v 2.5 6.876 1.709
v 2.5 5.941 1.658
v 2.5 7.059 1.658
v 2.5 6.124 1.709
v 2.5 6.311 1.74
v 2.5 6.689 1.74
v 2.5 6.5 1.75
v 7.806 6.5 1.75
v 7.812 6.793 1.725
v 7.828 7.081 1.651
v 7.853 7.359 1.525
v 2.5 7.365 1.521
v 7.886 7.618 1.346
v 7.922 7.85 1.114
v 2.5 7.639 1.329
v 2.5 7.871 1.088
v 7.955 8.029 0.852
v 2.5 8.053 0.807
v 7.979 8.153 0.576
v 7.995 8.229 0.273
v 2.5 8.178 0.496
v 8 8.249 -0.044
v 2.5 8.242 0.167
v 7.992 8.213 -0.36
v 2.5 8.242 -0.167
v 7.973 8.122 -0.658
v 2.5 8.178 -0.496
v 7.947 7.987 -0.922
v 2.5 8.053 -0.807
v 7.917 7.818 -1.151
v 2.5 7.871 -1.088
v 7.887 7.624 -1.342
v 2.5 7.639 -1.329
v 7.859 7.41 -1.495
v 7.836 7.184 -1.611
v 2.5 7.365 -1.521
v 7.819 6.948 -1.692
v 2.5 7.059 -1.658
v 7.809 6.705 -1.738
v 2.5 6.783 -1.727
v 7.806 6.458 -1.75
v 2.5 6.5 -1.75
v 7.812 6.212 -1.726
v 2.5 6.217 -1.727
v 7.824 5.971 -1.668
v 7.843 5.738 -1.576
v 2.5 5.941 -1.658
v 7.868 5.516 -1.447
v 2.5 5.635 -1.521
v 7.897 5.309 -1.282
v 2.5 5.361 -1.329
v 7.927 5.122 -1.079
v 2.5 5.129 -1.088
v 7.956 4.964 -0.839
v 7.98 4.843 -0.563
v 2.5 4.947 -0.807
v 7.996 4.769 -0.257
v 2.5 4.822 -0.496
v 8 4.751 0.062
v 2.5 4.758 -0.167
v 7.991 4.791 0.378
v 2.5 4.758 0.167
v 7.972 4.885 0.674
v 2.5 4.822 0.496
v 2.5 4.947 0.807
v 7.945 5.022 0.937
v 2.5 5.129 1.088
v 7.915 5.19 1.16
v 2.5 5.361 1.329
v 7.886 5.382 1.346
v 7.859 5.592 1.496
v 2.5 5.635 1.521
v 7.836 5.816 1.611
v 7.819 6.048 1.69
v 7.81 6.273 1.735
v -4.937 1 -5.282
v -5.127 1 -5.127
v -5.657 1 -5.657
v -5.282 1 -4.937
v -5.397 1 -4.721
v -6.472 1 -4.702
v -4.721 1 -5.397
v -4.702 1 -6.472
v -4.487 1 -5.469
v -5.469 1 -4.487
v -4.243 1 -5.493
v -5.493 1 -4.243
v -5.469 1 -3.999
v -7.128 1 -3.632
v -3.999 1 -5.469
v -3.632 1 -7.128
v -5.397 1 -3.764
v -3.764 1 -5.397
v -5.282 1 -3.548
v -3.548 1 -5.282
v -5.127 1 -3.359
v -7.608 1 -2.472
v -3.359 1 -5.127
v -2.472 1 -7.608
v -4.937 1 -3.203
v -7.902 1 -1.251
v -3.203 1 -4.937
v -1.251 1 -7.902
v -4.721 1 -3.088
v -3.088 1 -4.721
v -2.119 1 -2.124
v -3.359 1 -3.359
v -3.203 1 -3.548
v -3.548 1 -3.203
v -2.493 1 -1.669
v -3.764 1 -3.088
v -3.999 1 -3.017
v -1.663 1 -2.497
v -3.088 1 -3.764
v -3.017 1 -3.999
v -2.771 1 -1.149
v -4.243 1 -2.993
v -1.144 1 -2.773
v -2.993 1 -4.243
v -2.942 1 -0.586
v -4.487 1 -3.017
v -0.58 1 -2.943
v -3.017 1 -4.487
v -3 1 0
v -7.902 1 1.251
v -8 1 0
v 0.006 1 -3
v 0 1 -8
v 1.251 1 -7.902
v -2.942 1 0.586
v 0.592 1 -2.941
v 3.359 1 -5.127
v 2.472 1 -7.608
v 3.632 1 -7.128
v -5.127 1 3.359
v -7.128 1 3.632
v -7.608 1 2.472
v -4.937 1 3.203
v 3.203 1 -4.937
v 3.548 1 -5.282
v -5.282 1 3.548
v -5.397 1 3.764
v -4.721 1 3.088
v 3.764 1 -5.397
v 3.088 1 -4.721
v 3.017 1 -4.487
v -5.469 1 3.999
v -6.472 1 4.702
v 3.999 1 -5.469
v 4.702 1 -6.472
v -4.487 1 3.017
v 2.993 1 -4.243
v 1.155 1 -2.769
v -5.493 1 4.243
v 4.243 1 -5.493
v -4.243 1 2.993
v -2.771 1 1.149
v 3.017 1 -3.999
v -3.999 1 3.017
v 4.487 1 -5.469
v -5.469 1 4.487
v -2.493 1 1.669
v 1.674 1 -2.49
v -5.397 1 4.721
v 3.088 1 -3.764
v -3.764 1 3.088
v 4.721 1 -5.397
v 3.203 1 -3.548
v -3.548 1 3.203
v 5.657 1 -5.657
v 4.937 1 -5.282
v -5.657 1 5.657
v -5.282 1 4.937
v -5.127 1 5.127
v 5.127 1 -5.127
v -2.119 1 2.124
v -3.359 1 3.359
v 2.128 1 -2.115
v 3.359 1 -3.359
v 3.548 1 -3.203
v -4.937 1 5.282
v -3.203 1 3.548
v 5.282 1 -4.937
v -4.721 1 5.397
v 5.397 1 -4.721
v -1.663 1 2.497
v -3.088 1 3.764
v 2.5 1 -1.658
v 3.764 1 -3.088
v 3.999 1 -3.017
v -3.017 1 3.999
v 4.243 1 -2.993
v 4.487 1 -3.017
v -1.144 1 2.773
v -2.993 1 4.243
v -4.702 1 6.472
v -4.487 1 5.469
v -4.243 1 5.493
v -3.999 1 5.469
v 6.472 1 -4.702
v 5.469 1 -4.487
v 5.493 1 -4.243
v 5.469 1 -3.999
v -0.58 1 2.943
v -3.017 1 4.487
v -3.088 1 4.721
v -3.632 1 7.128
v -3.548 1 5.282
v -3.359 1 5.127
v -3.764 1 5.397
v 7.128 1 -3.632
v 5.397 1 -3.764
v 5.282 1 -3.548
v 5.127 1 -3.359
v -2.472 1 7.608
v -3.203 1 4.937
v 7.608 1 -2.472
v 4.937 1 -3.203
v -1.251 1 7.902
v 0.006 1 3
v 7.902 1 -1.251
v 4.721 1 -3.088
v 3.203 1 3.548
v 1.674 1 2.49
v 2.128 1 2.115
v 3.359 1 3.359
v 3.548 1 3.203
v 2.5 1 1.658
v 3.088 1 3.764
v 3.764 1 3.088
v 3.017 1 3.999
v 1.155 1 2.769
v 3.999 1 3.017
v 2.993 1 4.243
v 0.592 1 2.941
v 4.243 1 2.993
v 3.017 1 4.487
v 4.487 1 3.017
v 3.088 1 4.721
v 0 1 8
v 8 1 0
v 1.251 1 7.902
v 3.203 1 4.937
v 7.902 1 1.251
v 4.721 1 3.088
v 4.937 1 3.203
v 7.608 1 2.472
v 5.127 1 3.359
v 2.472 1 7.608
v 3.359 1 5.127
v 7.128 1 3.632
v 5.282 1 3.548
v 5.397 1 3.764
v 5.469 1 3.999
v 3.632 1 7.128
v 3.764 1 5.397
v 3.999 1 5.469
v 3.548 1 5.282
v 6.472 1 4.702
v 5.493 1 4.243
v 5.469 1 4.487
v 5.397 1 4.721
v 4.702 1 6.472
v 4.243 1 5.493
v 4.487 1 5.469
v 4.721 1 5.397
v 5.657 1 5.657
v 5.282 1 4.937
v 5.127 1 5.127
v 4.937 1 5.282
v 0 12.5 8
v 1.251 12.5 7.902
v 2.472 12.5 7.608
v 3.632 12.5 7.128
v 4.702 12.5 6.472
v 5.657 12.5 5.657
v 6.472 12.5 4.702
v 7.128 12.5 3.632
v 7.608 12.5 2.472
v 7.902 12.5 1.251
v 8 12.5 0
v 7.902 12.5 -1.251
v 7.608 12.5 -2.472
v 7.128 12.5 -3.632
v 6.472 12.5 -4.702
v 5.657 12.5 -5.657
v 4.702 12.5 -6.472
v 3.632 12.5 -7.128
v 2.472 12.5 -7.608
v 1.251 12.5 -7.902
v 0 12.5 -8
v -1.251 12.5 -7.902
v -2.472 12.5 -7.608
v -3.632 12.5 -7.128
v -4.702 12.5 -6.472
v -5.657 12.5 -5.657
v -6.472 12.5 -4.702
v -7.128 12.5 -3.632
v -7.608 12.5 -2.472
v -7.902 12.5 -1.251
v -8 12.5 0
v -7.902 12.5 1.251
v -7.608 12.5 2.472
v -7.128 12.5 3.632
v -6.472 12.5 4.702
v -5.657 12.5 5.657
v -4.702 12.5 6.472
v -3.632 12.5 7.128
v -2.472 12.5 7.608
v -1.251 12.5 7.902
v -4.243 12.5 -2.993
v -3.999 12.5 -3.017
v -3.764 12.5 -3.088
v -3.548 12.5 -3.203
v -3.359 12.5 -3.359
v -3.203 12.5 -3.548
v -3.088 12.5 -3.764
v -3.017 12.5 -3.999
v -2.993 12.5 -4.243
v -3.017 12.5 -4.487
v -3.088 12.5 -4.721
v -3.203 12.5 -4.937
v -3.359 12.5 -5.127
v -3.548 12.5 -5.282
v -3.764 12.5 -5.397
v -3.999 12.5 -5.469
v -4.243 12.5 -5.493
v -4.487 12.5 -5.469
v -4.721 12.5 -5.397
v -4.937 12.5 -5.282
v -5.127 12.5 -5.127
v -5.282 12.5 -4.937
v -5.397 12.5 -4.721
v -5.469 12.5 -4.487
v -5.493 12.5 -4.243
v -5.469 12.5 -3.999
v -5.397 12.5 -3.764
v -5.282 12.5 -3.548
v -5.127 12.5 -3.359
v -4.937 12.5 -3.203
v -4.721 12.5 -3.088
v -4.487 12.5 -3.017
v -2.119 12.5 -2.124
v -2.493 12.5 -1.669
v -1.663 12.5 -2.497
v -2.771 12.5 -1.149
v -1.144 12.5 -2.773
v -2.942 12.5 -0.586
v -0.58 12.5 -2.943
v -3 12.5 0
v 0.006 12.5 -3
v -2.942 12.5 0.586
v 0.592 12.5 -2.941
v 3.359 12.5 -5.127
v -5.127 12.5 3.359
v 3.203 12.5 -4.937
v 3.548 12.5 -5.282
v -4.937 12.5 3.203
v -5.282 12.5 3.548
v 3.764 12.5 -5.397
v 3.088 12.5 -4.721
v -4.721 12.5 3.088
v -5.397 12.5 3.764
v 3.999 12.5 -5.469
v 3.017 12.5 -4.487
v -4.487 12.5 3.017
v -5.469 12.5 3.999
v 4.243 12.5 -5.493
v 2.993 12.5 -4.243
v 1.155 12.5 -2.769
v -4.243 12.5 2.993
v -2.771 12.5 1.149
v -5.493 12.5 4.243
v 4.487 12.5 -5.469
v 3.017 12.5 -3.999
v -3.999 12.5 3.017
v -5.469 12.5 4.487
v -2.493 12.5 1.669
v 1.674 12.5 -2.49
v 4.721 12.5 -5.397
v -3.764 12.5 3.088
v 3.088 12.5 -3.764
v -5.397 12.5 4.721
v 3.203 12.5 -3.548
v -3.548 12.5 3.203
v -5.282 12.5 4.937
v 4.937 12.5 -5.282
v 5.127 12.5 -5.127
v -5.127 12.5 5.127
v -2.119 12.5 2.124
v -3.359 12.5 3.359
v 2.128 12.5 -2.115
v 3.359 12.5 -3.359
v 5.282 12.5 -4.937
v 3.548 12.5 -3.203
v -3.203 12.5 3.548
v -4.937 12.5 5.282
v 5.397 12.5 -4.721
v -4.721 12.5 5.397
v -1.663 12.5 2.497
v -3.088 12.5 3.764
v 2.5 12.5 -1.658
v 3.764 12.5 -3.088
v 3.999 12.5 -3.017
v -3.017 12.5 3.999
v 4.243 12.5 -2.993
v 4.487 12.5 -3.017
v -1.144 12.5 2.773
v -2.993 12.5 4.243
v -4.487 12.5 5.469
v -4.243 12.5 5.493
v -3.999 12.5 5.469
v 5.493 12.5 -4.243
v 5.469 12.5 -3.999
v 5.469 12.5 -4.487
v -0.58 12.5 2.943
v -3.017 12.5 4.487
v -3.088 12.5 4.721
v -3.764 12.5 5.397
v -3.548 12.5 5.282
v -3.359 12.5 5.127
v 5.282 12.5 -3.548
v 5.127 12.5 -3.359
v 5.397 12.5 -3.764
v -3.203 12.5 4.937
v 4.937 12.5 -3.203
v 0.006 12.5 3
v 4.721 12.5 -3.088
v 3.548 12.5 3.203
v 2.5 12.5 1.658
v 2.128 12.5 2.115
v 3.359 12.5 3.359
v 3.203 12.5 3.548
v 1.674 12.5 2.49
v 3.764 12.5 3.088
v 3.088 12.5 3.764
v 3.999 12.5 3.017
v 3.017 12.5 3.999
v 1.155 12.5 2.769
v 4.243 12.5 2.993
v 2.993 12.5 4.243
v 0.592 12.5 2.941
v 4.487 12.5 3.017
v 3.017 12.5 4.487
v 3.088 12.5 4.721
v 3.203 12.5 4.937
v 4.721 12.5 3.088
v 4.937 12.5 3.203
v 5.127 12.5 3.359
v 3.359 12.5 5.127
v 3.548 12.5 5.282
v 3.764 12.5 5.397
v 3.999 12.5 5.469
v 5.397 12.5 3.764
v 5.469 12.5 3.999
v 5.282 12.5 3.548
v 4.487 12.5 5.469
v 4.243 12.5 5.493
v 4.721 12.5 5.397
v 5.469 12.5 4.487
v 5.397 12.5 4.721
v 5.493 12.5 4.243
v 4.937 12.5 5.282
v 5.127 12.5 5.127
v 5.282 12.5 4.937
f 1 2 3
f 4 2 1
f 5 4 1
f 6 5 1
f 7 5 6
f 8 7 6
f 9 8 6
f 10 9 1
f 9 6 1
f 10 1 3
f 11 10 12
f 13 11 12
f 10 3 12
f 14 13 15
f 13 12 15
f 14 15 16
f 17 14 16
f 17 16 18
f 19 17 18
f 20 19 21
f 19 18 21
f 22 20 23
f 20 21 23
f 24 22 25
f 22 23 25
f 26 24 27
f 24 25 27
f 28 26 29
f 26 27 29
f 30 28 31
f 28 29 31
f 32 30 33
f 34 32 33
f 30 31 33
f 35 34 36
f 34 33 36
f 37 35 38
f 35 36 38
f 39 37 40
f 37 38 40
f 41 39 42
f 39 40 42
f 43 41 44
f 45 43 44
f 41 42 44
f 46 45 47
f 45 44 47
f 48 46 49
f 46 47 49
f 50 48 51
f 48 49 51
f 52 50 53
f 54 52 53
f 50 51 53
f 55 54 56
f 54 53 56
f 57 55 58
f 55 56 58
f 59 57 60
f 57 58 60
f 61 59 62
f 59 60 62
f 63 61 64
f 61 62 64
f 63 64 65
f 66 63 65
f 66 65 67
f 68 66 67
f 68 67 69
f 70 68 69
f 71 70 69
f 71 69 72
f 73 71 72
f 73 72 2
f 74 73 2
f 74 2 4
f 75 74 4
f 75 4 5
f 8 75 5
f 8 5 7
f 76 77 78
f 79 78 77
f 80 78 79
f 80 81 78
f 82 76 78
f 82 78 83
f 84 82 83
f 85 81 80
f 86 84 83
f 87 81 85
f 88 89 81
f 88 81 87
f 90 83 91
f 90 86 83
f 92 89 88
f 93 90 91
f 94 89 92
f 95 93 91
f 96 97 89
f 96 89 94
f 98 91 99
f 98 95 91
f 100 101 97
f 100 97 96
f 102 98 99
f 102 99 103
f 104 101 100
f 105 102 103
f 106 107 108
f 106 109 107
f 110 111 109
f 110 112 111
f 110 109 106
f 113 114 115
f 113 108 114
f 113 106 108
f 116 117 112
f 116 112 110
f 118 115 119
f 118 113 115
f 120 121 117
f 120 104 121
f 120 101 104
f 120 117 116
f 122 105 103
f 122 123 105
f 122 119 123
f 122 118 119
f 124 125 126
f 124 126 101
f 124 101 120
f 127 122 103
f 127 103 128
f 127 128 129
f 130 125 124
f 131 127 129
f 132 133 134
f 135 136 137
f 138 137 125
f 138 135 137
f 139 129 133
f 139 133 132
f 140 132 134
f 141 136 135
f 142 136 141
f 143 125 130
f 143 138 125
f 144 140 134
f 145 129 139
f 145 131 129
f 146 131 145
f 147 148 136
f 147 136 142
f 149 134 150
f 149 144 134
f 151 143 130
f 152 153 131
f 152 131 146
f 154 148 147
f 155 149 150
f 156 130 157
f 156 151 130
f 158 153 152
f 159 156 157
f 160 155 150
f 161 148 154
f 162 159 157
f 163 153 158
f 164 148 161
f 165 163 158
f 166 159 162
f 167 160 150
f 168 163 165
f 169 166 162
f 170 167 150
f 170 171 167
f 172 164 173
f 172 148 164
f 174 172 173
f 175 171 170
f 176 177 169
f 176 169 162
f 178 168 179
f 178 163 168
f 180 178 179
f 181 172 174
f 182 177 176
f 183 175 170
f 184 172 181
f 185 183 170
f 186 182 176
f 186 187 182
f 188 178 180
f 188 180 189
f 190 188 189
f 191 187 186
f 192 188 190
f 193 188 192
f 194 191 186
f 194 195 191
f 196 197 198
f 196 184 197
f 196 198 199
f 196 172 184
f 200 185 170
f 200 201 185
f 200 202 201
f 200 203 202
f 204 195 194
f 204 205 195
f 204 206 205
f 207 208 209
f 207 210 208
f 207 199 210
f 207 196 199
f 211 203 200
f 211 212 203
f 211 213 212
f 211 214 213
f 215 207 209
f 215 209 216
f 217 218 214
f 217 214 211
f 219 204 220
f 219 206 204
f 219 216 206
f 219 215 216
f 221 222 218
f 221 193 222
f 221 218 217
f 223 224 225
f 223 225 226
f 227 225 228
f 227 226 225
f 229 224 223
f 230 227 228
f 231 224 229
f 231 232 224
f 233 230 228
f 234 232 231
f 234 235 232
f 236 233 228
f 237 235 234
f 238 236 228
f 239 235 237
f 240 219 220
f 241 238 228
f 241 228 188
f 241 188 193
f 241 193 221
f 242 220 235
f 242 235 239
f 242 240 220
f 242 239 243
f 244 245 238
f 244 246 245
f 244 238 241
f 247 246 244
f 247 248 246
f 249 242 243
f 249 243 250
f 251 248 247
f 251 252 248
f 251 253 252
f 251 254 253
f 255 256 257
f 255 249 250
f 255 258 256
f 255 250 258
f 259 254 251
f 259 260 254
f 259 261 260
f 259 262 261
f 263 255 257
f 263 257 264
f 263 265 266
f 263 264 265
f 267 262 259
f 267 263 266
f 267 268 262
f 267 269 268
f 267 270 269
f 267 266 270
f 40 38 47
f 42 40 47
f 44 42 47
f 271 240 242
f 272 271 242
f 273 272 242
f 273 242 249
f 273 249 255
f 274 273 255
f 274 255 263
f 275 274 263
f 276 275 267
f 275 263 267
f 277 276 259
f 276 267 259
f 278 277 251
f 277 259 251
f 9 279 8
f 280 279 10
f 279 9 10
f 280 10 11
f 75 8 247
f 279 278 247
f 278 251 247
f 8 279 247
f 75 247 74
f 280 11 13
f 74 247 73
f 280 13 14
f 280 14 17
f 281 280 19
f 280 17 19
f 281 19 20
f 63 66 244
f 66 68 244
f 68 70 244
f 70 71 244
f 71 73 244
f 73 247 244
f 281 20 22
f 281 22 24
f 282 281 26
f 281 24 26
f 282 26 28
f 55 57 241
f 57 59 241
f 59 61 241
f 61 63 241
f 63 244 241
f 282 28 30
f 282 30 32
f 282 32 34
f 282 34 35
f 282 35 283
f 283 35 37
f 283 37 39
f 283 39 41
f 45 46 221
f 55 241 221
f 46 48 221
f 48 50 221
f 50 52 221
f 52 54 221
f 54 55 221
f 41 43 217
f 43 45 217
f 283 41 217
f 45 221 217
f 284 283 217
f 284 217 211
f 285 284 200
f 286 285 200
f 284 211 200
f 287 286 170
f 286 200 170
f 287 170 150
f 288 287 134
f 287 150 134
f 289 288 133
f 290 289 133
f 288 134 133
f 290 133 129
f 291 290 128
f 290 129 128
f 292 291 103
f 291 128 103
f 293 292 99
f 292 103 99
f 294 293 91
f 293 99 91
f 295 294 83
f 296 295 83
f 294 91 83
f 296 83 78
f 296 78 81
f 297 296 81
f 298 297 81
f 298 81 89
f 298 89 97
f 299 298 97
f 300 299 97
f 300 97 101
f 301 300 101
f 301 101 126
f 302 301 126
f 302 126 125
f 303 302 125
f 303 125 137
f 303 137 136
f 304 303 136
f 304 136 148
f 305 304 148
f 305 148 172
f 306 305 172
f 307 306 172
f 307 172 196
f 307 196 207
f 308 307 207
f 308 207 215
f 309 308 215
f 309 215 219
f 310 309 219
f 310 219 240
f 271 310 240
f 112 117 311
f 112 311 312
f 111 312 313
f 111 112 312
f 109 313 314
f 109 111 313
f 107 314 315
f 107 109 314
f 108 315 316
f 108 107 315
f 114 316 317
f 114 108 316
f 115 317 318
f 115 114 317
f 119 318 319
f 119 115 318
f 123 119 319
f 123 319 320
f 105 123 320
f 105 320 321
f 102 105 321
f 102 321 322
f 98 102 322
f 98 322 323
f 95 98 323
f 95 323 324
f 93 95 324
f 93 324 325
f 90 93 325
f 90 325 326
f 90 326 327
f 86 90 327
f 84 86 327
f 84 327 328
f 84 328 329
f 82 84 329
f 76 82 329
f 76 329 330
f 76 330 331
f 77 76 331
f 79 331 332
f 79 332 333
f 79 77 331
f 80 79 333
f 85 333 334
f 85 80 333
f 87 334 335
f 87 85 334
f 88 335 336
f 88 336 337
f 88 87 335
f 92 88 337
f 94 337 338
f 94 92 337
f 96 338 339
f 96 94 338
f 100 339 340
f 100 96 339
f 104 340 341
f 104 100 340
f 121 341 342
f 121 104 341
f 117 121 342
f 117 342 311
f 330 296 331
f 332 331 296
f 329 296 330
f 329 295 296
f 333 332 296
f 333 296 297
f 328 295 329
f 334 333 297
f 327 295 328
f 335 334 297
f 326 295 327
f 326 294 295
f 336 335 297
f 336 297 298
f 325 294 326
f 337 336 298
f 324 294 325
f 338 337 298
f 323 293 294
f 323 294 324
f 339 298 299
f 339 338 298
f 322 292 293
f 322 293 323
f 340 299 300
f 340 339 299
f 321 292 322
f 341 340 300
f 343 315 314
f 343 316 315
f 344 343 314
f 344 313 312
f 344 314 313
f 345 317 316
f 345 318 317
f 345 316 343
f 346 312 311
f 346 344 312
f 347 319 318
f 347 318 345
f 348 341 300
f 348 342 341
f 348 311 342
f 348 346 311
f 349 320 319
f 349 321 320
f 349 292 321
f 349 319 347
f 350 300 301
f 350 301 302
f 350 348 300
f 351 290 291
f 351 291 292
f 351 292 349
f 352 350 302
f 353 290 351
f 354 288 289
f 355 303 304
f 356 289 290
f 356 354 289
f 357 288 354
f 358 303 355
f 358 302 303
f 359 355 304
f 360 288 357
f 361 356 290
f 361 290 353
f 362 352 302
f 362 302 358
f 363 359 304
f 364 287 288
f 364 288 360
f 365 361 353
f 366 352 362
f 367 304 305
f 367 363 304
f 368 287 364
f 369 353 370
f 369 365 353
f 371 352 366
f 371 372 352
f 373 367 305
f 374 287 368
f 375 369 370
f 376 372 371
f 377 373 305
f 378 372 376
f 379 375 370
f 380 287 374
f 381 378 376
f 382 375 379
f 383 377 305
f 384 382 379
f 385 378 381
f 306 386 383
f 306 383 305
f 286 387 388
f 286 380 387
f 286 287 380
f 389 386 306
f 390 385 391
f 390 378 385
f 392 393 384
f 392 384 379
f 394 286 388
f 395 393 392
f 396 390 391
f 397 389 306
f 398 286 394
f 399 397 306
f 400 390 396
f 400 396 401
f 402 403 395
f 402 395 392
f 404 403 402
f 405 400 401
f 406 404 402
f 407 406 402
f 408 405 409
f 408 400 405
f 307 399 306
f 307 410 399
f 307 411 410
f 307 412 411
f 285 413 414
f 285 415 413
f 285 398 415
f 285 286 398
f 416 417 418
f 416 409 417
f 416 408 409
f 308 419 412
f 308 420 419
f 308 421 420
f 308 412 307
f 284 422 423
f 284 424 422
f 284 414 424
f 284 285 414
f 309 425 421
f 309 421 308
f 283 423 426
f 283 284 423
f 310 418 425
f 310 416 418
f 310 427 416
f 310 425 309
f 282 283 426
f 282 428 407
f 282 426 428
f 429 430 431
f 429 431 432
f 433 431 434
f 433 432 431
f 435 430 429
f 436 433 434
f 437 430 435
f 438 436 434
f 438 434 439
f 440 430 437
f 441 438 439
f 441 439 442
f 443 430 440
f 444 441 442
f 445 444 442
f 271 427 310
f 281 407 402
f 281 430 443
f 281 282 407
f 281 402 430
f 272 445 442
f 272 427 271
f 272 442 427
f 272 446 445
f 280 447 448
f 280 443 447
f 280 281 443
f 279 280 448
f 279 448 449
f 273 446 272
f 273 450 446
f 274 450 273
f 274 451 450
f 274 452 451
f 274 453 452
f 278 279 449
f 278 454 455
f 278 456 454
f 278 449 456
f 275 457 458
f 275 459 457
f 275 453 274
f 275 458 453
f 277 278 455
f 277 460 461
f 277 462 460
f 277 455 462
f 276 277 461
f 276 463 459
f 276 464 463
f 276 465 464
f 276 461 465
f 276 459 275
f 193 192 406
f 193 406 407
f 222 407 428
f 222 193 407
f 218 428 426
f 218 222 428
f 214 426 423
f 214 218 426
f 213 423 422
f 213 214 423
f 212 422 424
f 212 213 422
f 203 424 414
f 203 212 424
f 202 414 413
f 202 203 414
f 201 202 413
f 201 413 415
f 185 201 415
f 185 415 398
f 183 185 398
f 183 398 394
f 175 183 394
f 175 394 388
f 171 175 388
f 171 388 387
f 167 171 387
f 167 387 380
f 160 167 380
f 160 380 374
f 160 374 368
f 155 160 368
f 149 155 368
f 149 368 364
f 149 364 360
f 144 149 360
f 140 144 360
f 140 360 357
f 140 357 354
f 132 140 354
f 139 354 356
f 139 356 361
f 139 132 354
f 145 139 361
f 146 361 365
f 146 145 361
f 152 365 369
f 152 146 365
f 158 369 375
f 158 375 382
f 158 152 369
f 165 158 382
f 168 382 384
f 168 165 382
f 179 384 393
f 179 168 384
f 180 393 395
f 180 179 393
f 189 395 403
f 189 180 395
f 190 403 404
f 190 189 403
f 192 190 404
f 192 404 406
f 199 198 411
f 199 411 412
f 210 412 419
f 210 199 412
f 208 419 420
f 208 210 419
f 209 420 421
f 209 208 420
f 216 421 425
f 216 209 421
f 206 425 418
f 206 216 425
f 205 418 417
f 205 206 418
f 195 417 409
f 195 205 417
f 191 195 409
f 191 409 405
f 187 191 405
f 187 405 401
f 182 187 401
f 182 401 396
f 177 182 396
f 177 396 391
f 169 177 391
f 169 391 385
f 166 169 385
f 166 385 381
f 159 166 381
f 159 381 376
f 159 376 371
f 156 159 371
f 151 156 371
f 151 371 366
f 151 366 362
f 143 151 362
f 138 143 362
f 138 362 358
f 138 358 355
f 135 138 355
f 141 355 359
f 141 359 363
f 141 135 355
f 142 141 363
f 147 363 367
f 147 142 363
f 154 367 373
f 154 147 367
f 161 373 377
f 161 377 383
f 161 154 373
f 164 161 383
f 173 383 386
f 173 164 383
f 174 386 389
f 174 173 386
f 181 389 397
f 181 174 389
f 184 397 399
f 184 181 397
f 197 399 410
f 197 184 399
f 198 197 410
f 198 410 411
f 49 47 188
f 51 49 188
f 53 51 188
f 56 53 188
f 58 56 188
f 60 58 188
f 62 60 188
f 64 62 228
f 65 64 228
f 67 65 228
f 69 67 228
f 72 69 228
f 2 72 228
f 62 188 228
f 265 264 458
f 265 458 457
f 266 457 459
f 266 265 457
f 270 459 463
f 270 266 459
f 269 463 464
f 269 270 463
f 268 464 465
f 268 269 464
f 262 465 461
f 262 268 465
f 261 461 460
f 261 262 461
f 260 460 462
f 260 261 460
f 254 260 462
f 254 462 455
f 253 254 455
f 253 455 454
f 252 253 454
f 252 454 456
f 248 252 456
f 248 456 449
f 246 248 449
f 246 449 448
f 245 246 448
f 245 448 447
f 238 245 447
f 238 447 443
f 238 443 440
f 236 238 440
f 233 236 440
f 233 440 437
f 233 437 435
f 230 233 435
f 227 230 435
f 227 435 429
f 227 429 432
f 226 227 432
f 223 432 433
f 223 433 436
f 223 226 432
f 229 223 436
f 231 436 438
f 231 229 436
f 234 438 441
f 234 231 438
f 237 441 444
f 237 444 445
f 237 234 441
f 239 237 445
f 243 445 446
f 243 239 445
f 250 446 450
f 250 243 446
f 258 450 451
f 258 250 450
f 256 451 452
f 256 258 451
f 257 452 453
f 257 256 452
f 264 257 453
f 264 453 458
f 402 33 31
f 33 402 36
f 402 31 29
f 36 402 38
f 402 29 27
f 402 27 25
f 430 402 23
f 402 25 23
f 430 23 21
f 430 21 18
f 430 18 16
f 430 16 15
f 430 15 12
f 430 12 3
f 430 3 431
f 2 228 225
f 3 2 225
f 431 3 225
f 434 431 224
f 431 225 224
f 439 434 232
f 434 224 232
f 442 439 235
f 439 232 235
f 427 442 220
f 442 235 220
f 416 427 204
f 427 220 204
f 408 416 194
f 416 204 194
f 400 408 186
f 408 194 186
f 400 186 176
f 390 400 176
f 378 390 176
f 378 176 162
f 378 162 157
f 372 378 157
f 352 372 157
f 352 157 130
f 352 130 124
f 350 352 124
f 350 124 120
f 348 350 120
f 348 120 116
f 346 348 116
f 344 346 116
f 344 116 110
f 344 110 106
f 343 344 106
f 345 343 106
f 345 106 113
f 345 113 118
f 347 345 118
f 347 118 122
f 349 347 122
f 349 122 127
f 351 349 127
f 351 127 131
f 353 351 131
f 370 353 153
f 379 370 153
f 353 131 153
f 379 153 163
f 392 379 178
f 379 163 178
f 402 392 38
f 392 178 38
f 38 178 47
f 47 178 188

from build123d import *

# Parameters (mm, degrees)
SKETCH_1_R          = 8
SKETCH_1_R_2        = 1.25
EXTRUDE_1_DEPTH     = 12.5
SKETCH_3_R          = 1.75
CUT_EXTRUDE_1_DEPTH = 10
SKETCH_5_R          = 11.085638204
CUT_EXTRUDE_2_DEPTH = 1


with BuildPart() as part:
    # 草图1 → 凸台-拉伸1 (new body)
    with BuildSketch(Plane(origin=(0, 0, 0), x_dir=(1, 0, 0), z_dir=(0, 1, 0))):
        with Locations(Location((0, 0, 0), (0, 0, 270))):
            Circle(SKETCH_1_R)
        with Locations(Location((4.242640687, 4.242640687, 0), (0, 0, 270))):
            Circle(SKETCH_1_R_2, mode=Mode.SUBTRACT)
        with Locations(Location((4.242640687, -4.242640687, 0), (0, 0, 270))):
            Circle(SKETCH_1_R_2, mode=Mode.SUBTRACT)
        with Locations(Location((-4.242640687, -4.242640687, 0), (0, 0, 270))):
            Circle(SKETCH_1_R_2, mode=Mode.SUBTRACT)
        with Locations(Location((-4.242640687, 4.242640687, 0), (0, 0, 270))):
            Circle(SKETCH_1_R_2, mode=Mode.SUBTRACT)
        with BuildLine():
            Line((2.5, 1.658312395), (2.5, -1.658312395))
            ThreePointArc((2.5, -1.658312395), (-3, 0), (2.5, 1.658312395))
        make_face(mode=Mode.SUBTRACT)
    extrude(amount=EXTRUDE_1_DEPTH)

    # 草图3 → 切除-拉伸1 (cut)
    with BuildSketch(Plane.ZY.offset(-2.5)):
        with Locations((0, 6.5)):
            Circle(SKETCH_3_R)
    extrude(amount=-CUT_EXTRUDE_1_DEPTH, mode=Mode.SUBTRACT)

    # 草图5 → 切除-拉伸2 (cut)
    with BuildSketch(Plane.XZ):
        Circle(SKETCH_5_R)
    extrude(amount=-CUT_EXTRUDE_2_DEPTH, mode=Mode.SUBTRACT)


solid = part.part
